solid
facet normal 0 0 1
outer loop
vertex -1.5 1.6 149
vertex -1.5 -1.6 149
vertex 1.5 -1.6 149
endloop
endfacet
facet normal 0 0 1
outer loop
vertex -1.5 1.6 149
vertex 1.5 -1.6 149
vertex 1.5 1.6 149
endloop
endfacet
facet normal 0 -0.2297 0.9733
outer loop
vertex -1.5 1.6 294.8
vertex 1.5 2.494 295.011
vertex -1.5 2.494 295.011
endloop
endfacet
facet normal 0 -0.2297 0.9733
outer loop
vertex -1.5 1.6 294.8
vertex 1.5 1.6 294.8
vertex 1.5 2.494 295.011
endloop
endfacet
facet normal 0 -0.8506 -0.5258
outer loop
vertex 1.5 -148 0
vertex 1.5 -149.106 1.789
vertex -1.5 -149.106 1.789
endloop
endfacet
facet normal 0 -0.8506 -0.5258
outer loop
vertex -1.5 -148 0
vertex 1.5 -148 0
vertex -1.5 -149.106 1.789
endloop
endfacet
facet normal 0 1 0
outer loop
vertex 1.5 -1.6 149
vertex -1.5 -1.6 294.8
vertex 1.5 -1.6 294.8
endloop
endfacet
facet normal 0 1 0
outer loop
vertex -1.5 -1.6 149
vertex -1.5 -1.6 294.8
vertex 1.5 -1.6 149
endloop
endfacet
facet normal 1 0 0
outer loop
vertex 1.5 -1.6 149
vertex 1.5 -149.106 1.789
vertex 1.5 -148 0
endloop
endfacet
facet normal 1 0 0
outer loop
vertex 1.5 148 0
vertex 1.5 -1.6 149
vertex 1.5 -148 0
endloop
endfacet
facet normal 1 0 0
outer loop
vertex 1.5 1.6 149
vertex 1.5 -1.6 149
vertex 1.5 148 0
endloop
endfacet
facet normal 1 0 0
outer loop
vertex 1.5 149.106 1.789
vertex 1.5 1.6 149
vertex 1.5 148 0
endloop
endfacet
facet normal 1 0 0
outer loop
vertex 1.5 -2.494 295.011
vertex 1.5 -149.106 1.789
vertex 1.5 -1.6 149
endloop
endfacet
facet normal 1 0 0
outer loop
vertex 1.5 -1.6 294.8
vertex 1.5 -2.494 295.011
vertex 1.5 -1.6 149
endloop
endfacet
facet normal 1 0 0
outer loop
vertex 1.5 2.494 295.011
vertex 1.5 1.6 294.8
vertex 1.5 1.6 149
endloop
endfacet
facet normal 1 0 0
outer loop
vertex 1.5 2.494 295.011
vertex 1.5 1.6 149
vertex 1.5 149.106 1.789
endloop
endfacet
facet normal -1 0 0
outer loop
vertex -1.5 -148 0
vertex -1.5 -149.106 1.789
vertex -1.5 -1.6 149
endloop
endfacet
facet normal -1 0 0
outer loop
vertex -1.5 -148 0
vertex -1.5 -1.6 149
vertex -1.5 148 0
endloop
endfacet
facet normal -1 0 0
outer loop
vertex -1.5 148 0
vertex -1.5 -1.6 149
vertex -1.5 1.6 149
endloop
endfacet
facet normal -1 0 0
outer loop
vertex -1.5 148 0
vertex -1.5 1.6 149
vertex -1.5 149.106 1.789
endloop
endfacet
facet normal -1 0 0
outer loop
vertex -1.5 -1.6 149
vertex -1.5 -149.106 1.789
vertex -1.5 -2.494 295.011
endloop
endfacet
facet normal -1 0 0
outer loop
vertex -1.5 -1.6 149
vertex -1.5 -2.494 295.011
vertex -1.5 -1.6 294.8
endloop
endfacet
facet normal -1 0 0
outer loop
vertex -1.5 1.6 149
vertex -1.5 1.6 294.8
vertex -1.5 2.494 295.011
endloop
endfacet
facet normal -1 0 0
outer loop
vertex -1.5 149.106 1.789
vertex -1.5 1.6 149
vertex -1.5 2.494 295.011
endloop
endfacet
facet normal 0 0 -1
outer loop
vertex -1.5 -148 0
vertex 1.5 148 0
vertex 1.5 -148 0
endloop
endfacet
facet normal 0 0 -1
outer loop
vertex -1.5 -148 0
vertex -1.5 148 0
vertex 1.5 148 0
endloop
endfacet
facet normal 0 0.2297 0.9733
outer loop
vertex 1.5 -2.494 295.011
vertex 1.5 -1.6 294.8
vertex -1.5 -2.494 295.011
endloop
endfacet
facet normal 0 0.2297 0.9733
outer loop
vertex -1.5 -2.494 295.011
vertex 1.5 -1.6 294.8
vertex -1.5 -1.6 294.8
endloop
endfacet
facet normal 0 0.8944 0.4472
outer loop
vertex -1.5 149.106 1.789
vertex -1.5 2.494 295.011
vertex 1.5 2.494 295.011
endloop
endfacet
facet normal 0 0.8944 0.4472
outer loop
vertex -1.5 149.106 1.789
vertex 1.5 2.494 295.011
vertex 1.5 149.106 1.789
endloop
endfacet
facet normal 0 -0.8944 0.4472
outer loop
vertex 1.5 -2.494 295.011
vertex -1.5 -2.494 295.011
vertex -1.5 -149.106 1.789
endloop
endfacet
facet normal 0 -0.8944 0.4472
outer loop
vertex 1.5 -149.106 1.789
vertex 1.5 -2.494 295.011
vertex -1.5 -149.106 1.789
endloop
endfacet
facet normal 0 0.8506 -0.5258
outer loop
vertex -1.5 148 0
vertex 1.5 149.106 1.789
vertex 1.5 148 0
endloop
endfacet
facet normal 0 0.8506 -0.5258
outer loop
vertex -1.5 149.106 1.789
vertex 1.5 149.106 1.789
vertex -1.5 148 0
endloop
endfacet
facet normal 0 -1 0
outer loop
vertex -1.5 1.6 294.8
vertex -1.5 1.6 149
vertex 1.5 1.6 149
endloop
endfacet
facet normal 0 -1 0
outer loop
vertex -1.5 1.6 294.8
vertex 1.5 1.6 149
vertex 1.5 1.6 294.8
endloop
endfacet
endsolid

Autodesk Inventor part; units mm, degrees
ref_plane "YZ Plane" through (0, 0, 0) normal (1, 0, 0) x (0, 1, 0)
ref_plane "XZ Plane" through (0, 0, 0) normal (0, 1, 0) x (-1, 0, 0)
ref_plane "XY Plane" through (0, 0, 0) normal (0, 0, 1) x (1, 0, 0)
sketch "Sketch1" plane through (0, 0, 0) normal (1, 0, 0) x (0, 1, 0)
  line L0 (150, 0) -> (-150, 0)
  line L1 (0, 0) -> (0, 300)
  line L2 (0, 300) -> (150, 0)
  line L3 (0, 300) -> (-150, 0)
  dimension "d0" = 300
  dimension "d1" = 300
extrude "Plate1" add sketch "Sketch1" along normal mid plane 3
sketch "Sketch2" plane through (-1.5, 0, 0) normal (-1, 0, 0) x (0, 0, 1)
  line L0 (300, -1.6) -> (149, -1.6)
  line L1 (149, -1.6) -> (149, 1.6)
  line L2 (149, 1.6) -> (300, 1.6)
  line L3 (300, 1.6) -> (300, -1.6)
  point P0 (0, 0)
  point P1 (300, 0)
  point P2 (300, 0)
  dimension "d3" = 3.2
  dimension "d4" = 151
extrude "Extrusion1" cut sketch "Sketch2" against normal through all
chamfer "Corner Chamfer1" distance 2 angle 45 4 edges at (0, -1.6, 296.8) (0, 1.6, 296.8) (0, 150, 0) (0, -150, 0)
equation "\"d2\" = Thickness"
equation "\"BendReliefWidth\" = Thickness"
equation "\"BendReliefDepth\" = 0.5 * Thickness"
equation "\"CornerReliefSize\" = 4 * Thickness"
equation "\"MinimumRemnant\" = 2 * Thickness"
equation "\"TransitionRadius\" = BendRadius"
equation "\"JacobiRadiusSize\" = BendRadius"
equation "\"GapSize\" = Thickness"
equation "\"Thickness\" = 3"
equation "\"BendRadius\" = 5"
properties part number "MSC 205 CONE BLADE" material "Stainless Steel"
